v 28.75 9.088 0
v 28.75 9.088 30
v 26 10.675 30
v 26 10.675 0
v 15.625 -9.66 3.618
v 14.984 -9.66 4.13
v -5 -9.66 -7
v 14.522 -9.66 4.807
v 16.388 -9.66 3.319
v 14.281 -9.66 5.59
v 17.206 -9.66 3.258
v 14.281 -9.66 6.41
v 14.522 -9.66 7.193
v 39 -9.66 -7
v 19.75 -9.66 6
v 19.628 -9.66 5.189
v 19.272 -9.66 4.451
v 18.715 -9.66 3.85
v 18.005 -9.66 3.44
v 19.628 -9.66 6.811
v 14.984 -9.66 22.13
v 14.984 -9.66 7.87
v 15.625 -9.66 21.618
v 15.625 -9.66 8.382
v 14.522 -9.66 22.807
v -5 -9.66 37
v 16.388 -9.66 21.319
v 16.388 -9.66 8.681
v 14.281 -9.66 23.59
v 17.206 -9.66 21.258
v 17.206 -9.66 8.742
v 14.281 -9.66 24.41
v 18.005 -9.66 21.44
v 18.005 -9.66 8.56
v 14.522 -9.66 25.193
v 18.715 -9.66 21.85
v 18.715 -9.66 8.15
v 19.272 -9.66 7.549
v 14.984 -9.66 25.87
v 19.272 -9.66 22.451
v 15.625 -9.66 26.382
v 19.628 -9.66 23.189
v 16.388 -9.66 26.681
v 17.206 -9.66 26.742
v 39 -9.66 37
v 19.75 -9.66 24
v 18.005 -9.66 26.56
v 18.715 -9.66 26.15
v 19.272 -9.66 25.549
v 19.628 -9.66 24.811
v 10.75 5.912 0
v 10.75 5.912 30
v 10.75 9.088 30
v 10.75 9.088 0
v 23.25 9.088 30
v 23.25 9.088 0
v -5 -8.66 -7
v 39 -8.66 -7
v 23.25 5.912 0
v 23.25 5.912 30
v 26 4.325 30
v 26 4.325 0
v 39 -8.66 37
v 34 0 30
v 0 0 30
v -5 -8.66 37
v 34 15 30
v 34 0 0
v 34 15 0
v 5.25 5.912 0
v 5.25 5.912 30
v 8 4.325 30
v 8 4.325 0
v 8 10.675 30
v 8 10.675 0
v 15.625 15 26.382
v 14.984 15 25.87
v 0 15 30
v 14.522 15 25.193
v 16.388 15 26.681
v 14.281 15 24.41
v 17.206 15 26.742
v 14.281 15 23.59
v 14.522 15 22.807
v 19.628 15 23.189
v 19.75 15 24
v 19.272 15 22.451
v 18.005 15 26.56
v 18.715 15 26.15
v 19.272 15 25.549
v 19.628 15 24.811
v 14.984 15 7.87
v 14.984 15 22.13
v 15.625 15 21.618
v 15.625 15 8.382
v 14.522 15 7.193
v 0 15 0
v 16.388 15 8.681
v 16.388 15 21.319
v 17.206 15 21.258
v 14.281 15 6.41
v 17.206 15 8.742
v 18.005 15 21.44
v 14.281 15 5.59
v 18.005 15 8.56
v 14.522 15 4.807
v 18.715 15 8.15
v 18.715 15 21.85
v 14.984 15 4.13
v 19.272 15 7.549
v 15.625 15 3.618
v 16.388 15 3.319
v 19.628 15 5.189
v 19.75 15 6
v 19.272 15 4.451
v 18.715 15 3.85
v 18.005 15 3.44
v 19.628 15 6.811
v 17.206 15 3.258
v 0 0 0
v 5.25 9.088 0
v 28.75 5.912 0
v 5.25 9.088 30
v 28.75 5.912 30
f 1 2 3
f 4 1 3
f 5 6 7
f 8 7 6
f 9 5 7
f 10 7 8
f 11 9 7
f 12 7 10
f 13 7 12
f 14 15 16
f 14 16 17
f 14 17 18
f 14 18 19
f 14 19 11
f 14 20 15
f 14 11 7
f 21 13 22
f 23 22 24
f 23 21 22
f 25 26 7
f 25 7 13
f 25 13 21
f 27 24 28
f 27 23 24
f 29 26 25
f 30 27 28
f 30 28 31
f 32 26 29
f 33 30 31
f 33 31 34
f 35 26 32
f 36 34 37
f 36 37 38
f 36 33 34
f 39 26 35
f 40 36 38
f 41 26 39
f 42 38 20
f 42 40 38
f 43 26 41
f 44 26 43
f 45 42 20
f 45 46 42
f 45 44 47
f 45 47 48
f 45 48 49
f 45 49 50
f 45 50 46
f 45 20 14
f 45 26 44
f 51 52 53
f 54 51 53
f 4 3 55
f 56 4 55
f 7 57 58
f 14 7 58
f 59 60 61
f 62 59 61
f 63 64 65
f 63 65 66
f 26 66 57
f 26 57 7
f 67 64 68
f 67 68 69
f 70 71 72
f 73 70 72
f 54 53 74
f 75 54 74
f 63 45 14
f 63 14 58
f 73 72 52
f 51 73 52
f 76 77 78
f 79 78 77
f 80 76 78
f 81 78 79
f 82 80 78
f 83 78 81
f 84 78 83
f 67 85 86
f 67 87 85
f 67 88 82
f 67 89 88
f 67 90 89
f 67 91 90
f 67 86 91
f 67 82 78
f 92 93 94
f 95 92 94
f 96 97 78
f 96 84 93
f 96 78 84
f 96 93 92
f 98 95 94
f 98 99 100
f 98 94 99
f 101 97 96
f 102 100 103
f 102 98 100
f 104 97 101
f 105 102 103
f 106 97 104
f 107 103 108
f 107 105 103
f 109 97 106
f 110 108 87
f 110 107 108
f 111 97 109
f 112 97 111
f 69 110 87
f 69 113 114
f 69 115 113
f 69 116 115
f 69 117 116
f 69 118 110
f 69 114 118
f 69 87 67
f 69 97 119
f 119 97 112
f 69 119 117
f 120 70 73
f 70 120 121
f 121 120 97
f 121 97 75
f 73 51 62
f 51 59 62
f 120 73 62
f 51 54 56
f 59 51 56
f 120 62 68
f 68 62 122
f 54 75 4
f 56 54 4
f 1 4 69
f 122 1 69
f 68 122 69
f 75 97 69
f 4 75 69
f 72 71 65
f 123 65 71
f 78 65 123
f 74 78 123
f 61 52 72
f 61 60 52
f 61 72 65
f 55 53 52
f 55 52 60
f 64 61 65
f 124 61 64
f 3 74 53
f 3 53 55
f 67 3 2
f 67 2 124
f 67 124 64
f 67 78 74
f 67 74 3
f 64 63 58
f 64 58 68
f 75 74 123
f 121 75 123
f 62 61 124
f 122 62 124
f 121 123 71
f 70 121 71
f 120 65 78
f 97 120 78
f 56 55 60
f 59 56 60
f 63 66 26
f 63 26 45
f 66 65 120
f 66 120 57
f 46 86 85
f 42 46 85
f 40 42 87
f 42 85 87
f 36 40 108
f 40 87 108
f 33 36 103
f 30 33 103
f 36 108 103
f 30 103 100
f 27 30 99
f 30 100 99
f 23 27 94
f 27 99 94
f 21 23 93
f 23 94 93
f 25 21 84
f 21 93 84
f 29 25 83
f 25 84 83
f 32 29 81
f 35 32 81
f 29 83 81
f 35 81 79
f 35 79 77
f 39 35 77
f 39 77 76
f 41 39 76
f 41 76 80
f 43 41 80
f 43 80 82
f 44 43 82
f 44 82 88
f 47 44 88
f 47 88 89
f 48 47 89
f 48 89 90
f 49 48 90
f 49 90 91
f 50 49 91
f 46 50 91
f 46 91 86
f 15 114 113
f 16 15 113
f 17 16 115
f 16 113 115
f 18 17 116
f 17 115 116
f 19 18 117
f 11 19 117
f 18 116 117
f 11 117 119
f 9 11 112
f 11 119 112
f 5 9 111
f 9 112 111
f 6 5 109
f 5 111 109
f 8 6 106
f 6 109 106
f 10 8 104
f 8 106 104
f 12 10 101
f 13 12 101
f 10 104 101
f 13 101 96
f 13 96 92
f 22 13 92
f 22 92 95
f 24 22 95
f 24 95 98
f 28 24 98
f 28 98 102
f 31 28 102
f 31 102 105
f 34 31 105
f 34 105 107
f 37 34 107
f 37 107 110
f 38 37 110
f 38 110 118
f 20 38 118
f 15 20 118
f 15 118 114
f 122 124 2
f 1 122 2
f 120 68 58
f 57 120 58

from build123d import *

# Parameters (mm, degrees)
SKETCH1_W                = 34
SKETCH1_H                = 15
BOSS_EXTRUDE1_DEPTH      = 30
BOSS_EXTRUDE2_DEPTH      = 7
BOSS_EXTRUDE2_DEPTH_BACK = 37
CUT_EXTRUDE2_DEPTH       = 38
CUT_EXTRUDE3_DEPTH       = 6
CUT_EXTRUDE3_DEPTH_BACK  = 40
SKETCH7_R                = 2.75
CUT_EXTRUDE4_DEPTH       = 25.660254038


with BuildPart() as part:
    # Sketch1 → Boss-Extrude1 (new body)
    with BuildSketch(Plane.XY):
        with Locations((17, 7.5)):
            Rectangle(SKETCH1_W, SKETCH1_H)
    extrude(amount=BOSS_EXTRUDE1_DEPTH)

    # Sketch3 → Boss-Extrude2 (add, two sides)
    with BuildSketch(Plane.XY.offset(30)) as boss_extrude2_sk:
        Polygon((0, 0), (-5, -8.660254038), (-5, -9.660254038), (39, -9.660254038), (39, -8.660254038), (34, 0), align=None)
    extrude(amount=BOSS_EXTRUDE2_DEPTH)
    extrude(boss_extrude2_sk.sketch, amount=-BOSS_EXTRUDE2_DEPTH_BACK)

    # Sketch5 → Cut-Extrude2 (cut, through all)
    with BuildSketch(Plane.XY.offset(30)):
        Polygon((8, 4.324573519), (10.75, 5.91228676), (10.75, 9.08771324), (8, 10.675426481), (5.25, 9.08771324), (5.25, 5.91228676), align=None)
        Polygon((26, 4.324573519), (28.75, 5.91228676), (28.75, 9.08771324), (26, 10.675426481), (23.25, 9.08771324), (23.25, 5.91228676), align=None)
    extrude(amount=-CUT_EXTRUDE2_DEPTH, mode=Mode.SUBTRACT)

    # Sketch6 → Cut-Extrude3 (cut, two sides)
    with BuildSketch(Plane.ZY) as cut_extrude3_sk:
        Polygon((30, 0), (37, -8.660254038), (37, 0), align=None)
        Polygon((0, 0), (-7, -8.660254038), (-7, 0), align=None)
    extrude(amount=CUT_EXTRUDE3_DEPTH, mode=Mode.SUBTRACT)
    extrude(cut_extrude3_sk.sketch, amount=-CUT_EXTRUDE3_DEPTH_BACK, mode=Mode.SUBTRACT)

    # Sketch7 → Cut-Extrude4 (cut, through all)
    with BuildSketch(Plane(origin=(0, 15, 0), x_dir=(1, 0, 0), z_dir=(0, 1, 0))):
        with Locations((17, -6)):
            Circle(SKETCH7_R)
        with Locations((17, -24)):
            Circle(SKETCH7_R)
    extrude(amount=-CUT_EXTRUDE4_DEPTH, mode=Mode.SUBTRACT)


solid = part.part
